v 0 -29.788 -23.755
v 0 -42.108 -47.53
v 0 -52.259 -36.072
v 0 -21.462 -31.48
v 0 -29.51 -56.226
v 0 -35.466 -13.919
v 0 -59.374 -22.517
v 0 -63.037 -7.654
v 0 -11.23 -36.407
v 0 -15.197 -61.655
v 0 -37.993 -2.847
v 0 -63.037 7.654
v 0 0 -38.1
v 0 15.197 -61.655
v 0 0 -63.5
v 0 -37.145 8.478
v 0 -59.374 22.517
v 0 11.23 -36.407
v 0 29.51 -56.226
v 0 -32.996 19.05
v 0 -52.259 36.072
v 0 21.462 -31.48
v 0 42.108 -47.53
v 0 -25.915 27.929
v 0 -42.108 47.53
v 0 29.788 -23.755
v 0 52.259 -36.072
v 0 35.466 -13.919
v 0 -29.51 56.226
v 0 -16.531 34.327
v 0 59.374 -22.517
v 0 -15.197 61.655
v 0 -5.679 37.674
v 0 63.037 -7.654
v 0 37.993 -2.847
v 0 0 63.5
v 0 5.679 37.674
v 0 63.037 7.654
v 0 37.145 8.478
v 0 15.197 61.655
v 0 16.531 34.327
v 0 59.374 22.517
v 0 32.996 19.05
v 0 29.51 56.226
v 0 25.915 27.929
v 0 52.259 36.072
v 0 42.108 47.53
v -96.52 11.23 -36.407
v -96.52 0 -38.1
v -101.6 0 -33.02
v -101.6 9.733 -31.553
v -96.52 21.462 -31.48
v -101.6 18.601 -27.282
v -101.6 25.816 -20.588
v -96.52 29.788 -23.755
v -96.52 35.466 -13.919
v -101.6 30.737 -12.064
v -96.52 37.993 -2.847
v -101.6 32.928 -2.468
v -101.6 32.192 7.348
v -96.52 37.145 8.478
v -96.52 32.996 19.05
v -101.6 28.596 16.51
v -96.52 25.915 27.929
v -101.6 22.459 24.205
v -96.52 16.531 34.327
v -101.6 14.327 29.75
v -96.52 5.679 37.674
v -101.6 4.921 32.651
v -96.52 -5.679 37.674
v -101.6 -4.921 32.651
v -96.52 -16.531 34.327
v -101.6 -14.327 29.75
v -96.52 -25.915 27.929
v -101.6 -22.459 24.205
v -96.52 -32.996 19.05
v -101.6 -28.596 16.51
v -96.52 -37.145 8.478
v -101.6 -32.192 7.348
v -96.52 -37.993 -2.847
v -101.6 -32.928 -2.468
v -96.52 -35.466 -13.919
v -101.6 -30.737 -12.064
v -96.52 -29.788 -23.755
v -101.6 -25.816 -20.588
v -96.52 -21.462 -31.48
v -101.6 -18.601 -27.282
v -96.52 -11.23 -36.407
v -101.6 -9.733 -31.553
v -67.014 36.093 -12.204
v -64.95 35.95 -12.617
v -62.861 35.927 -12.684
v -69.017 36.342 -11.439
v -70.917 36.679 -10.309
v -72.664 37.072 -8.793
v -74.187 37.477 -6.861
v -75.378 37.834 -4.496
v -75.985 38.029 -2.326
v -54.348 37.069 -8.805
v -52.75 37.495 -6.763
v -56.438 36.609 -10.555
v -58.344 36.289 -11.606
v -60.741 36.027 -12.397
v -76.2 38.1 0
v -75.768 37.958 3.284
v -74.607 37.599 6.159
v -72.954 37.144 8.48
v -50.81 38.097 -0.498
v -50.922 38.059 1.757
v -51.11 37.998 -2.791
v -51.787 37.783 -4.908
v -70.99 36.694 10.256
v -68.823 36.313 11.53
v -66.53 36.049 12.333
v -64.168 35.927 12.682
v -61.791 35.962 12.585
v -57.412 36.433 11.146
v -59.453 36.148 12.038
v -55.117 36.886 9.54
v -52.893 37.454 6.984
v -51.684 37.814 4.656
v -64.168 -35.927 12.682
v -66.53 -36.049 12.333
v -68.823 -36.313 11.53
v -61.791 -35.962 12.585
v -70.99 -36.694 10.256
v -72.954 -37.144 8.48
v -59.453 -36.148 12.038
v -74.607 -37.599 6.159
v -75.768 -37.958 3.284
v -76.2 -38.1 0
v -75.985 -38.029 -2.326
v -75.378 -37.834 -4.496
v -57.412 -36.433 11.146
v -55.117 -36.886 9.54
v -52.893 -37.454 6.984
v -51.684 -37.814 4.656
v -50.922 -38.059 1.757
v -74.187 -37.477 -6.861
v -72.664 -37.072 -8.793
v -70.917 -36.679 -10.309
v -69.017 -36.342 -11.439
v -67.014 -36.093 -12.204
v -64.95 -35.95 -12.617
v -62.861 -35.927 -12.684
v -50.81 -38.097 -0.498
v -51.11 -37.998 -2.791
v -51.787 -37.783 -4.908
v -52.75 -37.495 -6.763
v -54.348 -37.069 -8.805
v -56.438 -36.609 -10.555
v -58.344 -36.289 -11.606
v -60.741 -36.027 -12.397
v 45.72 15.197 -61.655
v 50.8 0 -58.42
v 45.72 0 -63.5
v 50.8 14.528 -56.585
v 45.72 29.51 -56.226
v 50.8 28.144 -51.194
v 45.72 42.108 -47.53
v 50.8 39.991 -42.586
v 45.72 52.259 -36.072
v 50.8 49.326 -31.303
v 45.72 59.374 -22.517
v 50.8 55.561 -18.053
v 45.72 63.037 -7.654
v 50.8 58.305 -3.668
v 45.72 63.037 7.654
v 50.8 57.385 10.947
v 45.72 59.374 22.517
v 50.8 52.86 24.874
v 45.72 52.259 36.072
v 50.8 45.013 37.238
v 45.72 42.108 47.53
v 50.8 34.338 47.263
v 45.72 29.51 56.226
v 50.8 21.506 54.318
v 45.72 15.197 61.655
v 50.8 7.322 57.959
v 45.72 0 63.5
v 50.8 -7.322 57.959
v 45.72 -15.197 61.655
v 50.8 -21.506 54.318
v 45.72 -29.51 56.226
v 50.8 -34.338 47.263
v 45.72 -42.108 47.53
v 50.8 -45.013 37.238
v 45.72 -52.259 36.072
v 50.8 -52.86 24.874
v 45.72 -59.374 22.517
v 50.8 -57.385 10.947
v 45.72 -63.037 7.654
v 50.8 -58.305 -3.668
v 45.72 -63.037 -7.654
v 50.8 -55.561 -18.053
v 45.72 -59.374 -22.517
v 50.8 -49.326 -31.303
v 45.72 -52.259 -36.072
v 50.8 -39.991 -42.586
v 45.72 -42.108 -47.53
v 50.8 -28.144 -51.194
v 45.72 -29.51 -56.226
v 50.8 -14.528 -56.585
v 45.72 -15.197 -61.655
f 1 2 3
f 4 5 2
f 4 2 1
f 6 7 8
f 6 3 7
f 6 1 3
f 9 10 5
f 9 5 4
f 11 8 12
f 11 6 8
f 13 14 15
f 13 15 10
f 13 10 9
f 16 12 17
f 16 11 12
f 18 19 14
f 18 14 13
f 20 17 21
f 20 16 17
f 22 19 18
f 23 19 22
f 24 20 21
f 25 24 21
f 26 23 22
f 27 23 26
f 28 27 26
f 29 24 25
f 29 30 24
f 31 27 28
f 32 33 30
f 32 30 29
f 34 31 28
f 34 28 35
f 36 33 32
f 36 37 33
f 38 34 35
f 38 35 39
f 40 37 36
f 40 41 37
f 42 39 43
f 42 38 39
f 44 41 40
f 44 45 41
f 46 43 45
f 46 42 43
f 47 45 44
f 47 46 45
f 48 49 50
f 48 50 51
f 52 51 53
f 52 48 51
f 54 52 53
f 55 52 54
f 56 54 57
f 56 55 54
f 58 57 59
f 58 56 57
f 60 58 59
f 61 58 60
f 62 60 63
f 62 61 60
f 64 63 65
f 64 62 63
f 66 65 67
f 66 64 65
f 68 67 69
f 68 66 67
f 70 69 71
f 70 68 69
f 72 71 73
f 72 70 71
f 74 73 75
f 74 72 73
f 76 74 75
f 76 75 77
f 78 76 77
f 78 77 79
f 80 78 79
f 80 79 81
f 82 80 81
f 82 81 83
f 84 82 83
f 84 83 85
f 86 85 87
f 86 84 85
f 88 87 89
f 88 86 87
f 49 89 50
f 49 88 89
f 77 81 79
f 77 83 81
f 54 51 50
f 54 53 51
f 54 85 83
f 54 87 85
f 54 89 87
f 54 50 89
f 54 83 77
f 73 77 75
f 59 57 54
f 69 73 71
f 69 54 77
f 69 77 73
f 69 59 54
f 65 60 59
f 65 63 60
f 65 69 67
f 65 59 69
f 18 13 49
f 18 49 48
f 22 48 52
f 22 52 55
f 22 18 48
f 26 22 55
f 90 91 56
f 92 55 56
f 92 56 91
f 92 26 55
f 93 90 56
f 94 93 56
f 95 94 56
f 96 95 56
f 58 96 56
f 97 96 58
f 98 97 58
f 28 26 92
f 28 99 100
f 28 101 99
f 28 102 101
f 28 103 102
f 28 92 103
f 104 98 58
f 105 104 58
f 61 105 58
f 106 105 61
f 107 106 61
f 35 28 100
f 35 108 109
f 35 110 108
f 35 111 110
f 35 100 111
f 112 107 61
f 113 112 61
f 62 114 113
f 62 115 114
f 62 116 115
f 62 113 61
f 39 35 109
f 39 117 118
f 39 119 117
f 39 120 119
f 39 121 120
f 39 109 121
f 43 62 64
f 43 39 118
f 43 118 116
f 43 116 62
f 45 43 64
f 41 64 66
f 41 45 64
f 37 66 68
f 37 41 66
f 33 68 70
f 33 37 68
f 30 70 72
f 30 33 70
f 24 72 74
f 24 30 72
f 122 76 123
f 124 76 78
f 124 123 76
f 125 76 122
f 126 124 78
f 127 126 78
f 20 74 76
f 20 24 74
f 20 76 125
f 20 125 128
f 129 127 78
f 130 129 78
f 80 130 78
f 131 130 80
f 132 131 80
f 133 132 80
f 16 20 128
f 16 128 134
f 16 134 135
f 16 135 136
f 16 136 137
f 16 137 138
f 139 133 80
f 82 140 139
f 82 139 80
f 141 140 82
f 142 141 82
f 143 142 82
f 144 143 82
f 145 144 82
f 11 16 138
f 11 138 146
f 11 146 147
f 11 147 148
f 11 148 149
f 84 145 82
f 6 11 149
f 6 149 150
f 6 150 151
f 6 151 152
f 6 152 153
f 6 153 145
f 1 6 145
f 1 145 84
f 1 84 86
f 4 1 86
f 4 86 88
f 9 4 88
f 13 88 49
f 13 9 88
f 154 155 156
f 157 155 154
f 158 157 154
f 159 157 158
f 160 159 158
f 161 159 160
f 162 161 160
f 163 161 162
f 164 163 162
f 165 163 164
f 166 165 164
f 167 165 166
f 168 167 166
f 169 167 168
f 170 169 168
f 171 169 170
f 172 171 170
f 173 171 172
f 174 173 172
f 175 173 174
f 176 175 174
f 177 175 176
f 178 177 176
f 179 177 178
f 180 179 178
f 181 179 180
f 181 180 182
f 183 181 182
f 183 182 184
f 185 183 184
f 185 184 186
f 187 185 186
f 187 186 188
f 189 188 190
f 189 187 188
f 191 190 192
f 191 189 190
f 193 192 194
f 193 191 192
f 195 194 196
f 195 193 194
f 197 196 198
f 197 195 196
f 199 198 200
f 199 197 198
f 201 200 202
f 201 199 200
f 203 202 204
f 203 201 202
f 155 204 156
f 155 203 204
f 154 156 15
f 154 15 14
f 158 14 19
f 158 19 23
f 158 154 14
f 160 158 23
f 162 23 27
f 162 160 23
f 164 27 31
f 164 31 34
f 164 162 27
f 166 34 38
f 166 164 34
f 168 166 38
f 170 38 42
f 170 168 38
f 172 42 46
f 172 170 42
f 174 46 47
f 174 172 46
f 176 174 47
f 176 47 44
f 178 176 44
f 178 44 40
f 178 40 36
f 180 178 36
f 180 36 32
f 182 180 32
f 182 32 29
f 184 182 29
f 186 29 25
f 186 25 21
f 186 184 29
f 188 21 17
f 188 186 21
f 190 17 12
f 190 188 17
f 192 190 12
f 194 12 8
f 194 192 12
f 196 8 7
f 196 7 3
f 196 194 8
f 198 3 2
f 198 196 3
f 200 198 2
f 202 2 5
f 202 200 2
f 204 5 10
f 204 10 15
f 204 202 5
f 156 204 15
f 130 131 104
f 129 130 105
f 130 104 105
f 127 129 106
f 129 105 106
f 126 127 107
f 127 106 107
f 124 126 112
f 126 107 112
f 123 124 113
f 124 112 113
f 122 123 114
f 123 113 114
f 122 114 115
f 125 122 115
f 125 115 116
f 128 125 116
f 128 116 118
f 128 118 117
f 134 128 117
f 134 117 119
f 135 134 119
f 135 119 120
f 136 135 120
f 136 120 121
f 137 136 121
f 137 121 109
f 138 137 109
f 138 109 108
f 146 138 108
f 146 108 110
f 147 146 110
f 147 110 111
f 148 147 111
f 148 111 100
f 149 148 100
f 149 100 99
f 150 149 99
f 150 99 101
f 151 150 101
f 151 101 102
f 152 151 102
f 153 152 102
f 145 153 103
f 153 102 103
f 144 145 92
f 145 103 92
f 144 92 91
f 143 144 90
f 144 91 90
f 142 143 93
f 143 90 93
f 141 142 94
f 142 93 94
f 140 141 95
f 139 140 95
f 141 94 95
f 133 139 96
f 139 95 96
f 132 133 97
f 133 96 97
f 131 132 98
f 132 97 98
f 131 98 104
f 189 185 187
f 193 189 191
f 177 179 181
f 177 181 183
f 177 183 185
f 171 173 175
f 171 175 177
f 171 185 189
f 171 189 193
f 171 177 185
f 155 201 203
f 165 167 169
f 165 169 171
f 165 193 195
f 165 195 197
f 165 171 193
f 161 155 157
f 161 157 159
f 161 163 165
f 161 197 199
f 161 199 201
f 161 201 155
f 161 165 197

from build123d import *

# Parameters (mm, degrees)
F4_D    = 25.4
F5_SIZE = 5.08


with BuildPart() as f1:
    # F0 (on Front) → F1 (revolve)
    with BuildSketch(Plane.XZ):
        Polygon((50.8, 0), (-101.6, 0), (-101.6, -38.1), (0, -38.1), (0, -63.5), (50.8, -63.5), align=None)
    revolve(axis=Axis((-25.4, 0, 0), (1, 0, 0)))

    # F4 (through all)
    with Locations(Plane.XZ.offset(38.1)):
        with Locations((-63.5, 0)):
            Hole(F4_D / 2)

    # F5
    f5_edges = [f1.edges().sort_by_distance(p)[0] for p in [
        (50.8, 0, 63.5),
        (-101.6, 0, 38.1),
    ]]
    chamfer(f5_edges, length=F5_SIZE)


solid = f1.part
